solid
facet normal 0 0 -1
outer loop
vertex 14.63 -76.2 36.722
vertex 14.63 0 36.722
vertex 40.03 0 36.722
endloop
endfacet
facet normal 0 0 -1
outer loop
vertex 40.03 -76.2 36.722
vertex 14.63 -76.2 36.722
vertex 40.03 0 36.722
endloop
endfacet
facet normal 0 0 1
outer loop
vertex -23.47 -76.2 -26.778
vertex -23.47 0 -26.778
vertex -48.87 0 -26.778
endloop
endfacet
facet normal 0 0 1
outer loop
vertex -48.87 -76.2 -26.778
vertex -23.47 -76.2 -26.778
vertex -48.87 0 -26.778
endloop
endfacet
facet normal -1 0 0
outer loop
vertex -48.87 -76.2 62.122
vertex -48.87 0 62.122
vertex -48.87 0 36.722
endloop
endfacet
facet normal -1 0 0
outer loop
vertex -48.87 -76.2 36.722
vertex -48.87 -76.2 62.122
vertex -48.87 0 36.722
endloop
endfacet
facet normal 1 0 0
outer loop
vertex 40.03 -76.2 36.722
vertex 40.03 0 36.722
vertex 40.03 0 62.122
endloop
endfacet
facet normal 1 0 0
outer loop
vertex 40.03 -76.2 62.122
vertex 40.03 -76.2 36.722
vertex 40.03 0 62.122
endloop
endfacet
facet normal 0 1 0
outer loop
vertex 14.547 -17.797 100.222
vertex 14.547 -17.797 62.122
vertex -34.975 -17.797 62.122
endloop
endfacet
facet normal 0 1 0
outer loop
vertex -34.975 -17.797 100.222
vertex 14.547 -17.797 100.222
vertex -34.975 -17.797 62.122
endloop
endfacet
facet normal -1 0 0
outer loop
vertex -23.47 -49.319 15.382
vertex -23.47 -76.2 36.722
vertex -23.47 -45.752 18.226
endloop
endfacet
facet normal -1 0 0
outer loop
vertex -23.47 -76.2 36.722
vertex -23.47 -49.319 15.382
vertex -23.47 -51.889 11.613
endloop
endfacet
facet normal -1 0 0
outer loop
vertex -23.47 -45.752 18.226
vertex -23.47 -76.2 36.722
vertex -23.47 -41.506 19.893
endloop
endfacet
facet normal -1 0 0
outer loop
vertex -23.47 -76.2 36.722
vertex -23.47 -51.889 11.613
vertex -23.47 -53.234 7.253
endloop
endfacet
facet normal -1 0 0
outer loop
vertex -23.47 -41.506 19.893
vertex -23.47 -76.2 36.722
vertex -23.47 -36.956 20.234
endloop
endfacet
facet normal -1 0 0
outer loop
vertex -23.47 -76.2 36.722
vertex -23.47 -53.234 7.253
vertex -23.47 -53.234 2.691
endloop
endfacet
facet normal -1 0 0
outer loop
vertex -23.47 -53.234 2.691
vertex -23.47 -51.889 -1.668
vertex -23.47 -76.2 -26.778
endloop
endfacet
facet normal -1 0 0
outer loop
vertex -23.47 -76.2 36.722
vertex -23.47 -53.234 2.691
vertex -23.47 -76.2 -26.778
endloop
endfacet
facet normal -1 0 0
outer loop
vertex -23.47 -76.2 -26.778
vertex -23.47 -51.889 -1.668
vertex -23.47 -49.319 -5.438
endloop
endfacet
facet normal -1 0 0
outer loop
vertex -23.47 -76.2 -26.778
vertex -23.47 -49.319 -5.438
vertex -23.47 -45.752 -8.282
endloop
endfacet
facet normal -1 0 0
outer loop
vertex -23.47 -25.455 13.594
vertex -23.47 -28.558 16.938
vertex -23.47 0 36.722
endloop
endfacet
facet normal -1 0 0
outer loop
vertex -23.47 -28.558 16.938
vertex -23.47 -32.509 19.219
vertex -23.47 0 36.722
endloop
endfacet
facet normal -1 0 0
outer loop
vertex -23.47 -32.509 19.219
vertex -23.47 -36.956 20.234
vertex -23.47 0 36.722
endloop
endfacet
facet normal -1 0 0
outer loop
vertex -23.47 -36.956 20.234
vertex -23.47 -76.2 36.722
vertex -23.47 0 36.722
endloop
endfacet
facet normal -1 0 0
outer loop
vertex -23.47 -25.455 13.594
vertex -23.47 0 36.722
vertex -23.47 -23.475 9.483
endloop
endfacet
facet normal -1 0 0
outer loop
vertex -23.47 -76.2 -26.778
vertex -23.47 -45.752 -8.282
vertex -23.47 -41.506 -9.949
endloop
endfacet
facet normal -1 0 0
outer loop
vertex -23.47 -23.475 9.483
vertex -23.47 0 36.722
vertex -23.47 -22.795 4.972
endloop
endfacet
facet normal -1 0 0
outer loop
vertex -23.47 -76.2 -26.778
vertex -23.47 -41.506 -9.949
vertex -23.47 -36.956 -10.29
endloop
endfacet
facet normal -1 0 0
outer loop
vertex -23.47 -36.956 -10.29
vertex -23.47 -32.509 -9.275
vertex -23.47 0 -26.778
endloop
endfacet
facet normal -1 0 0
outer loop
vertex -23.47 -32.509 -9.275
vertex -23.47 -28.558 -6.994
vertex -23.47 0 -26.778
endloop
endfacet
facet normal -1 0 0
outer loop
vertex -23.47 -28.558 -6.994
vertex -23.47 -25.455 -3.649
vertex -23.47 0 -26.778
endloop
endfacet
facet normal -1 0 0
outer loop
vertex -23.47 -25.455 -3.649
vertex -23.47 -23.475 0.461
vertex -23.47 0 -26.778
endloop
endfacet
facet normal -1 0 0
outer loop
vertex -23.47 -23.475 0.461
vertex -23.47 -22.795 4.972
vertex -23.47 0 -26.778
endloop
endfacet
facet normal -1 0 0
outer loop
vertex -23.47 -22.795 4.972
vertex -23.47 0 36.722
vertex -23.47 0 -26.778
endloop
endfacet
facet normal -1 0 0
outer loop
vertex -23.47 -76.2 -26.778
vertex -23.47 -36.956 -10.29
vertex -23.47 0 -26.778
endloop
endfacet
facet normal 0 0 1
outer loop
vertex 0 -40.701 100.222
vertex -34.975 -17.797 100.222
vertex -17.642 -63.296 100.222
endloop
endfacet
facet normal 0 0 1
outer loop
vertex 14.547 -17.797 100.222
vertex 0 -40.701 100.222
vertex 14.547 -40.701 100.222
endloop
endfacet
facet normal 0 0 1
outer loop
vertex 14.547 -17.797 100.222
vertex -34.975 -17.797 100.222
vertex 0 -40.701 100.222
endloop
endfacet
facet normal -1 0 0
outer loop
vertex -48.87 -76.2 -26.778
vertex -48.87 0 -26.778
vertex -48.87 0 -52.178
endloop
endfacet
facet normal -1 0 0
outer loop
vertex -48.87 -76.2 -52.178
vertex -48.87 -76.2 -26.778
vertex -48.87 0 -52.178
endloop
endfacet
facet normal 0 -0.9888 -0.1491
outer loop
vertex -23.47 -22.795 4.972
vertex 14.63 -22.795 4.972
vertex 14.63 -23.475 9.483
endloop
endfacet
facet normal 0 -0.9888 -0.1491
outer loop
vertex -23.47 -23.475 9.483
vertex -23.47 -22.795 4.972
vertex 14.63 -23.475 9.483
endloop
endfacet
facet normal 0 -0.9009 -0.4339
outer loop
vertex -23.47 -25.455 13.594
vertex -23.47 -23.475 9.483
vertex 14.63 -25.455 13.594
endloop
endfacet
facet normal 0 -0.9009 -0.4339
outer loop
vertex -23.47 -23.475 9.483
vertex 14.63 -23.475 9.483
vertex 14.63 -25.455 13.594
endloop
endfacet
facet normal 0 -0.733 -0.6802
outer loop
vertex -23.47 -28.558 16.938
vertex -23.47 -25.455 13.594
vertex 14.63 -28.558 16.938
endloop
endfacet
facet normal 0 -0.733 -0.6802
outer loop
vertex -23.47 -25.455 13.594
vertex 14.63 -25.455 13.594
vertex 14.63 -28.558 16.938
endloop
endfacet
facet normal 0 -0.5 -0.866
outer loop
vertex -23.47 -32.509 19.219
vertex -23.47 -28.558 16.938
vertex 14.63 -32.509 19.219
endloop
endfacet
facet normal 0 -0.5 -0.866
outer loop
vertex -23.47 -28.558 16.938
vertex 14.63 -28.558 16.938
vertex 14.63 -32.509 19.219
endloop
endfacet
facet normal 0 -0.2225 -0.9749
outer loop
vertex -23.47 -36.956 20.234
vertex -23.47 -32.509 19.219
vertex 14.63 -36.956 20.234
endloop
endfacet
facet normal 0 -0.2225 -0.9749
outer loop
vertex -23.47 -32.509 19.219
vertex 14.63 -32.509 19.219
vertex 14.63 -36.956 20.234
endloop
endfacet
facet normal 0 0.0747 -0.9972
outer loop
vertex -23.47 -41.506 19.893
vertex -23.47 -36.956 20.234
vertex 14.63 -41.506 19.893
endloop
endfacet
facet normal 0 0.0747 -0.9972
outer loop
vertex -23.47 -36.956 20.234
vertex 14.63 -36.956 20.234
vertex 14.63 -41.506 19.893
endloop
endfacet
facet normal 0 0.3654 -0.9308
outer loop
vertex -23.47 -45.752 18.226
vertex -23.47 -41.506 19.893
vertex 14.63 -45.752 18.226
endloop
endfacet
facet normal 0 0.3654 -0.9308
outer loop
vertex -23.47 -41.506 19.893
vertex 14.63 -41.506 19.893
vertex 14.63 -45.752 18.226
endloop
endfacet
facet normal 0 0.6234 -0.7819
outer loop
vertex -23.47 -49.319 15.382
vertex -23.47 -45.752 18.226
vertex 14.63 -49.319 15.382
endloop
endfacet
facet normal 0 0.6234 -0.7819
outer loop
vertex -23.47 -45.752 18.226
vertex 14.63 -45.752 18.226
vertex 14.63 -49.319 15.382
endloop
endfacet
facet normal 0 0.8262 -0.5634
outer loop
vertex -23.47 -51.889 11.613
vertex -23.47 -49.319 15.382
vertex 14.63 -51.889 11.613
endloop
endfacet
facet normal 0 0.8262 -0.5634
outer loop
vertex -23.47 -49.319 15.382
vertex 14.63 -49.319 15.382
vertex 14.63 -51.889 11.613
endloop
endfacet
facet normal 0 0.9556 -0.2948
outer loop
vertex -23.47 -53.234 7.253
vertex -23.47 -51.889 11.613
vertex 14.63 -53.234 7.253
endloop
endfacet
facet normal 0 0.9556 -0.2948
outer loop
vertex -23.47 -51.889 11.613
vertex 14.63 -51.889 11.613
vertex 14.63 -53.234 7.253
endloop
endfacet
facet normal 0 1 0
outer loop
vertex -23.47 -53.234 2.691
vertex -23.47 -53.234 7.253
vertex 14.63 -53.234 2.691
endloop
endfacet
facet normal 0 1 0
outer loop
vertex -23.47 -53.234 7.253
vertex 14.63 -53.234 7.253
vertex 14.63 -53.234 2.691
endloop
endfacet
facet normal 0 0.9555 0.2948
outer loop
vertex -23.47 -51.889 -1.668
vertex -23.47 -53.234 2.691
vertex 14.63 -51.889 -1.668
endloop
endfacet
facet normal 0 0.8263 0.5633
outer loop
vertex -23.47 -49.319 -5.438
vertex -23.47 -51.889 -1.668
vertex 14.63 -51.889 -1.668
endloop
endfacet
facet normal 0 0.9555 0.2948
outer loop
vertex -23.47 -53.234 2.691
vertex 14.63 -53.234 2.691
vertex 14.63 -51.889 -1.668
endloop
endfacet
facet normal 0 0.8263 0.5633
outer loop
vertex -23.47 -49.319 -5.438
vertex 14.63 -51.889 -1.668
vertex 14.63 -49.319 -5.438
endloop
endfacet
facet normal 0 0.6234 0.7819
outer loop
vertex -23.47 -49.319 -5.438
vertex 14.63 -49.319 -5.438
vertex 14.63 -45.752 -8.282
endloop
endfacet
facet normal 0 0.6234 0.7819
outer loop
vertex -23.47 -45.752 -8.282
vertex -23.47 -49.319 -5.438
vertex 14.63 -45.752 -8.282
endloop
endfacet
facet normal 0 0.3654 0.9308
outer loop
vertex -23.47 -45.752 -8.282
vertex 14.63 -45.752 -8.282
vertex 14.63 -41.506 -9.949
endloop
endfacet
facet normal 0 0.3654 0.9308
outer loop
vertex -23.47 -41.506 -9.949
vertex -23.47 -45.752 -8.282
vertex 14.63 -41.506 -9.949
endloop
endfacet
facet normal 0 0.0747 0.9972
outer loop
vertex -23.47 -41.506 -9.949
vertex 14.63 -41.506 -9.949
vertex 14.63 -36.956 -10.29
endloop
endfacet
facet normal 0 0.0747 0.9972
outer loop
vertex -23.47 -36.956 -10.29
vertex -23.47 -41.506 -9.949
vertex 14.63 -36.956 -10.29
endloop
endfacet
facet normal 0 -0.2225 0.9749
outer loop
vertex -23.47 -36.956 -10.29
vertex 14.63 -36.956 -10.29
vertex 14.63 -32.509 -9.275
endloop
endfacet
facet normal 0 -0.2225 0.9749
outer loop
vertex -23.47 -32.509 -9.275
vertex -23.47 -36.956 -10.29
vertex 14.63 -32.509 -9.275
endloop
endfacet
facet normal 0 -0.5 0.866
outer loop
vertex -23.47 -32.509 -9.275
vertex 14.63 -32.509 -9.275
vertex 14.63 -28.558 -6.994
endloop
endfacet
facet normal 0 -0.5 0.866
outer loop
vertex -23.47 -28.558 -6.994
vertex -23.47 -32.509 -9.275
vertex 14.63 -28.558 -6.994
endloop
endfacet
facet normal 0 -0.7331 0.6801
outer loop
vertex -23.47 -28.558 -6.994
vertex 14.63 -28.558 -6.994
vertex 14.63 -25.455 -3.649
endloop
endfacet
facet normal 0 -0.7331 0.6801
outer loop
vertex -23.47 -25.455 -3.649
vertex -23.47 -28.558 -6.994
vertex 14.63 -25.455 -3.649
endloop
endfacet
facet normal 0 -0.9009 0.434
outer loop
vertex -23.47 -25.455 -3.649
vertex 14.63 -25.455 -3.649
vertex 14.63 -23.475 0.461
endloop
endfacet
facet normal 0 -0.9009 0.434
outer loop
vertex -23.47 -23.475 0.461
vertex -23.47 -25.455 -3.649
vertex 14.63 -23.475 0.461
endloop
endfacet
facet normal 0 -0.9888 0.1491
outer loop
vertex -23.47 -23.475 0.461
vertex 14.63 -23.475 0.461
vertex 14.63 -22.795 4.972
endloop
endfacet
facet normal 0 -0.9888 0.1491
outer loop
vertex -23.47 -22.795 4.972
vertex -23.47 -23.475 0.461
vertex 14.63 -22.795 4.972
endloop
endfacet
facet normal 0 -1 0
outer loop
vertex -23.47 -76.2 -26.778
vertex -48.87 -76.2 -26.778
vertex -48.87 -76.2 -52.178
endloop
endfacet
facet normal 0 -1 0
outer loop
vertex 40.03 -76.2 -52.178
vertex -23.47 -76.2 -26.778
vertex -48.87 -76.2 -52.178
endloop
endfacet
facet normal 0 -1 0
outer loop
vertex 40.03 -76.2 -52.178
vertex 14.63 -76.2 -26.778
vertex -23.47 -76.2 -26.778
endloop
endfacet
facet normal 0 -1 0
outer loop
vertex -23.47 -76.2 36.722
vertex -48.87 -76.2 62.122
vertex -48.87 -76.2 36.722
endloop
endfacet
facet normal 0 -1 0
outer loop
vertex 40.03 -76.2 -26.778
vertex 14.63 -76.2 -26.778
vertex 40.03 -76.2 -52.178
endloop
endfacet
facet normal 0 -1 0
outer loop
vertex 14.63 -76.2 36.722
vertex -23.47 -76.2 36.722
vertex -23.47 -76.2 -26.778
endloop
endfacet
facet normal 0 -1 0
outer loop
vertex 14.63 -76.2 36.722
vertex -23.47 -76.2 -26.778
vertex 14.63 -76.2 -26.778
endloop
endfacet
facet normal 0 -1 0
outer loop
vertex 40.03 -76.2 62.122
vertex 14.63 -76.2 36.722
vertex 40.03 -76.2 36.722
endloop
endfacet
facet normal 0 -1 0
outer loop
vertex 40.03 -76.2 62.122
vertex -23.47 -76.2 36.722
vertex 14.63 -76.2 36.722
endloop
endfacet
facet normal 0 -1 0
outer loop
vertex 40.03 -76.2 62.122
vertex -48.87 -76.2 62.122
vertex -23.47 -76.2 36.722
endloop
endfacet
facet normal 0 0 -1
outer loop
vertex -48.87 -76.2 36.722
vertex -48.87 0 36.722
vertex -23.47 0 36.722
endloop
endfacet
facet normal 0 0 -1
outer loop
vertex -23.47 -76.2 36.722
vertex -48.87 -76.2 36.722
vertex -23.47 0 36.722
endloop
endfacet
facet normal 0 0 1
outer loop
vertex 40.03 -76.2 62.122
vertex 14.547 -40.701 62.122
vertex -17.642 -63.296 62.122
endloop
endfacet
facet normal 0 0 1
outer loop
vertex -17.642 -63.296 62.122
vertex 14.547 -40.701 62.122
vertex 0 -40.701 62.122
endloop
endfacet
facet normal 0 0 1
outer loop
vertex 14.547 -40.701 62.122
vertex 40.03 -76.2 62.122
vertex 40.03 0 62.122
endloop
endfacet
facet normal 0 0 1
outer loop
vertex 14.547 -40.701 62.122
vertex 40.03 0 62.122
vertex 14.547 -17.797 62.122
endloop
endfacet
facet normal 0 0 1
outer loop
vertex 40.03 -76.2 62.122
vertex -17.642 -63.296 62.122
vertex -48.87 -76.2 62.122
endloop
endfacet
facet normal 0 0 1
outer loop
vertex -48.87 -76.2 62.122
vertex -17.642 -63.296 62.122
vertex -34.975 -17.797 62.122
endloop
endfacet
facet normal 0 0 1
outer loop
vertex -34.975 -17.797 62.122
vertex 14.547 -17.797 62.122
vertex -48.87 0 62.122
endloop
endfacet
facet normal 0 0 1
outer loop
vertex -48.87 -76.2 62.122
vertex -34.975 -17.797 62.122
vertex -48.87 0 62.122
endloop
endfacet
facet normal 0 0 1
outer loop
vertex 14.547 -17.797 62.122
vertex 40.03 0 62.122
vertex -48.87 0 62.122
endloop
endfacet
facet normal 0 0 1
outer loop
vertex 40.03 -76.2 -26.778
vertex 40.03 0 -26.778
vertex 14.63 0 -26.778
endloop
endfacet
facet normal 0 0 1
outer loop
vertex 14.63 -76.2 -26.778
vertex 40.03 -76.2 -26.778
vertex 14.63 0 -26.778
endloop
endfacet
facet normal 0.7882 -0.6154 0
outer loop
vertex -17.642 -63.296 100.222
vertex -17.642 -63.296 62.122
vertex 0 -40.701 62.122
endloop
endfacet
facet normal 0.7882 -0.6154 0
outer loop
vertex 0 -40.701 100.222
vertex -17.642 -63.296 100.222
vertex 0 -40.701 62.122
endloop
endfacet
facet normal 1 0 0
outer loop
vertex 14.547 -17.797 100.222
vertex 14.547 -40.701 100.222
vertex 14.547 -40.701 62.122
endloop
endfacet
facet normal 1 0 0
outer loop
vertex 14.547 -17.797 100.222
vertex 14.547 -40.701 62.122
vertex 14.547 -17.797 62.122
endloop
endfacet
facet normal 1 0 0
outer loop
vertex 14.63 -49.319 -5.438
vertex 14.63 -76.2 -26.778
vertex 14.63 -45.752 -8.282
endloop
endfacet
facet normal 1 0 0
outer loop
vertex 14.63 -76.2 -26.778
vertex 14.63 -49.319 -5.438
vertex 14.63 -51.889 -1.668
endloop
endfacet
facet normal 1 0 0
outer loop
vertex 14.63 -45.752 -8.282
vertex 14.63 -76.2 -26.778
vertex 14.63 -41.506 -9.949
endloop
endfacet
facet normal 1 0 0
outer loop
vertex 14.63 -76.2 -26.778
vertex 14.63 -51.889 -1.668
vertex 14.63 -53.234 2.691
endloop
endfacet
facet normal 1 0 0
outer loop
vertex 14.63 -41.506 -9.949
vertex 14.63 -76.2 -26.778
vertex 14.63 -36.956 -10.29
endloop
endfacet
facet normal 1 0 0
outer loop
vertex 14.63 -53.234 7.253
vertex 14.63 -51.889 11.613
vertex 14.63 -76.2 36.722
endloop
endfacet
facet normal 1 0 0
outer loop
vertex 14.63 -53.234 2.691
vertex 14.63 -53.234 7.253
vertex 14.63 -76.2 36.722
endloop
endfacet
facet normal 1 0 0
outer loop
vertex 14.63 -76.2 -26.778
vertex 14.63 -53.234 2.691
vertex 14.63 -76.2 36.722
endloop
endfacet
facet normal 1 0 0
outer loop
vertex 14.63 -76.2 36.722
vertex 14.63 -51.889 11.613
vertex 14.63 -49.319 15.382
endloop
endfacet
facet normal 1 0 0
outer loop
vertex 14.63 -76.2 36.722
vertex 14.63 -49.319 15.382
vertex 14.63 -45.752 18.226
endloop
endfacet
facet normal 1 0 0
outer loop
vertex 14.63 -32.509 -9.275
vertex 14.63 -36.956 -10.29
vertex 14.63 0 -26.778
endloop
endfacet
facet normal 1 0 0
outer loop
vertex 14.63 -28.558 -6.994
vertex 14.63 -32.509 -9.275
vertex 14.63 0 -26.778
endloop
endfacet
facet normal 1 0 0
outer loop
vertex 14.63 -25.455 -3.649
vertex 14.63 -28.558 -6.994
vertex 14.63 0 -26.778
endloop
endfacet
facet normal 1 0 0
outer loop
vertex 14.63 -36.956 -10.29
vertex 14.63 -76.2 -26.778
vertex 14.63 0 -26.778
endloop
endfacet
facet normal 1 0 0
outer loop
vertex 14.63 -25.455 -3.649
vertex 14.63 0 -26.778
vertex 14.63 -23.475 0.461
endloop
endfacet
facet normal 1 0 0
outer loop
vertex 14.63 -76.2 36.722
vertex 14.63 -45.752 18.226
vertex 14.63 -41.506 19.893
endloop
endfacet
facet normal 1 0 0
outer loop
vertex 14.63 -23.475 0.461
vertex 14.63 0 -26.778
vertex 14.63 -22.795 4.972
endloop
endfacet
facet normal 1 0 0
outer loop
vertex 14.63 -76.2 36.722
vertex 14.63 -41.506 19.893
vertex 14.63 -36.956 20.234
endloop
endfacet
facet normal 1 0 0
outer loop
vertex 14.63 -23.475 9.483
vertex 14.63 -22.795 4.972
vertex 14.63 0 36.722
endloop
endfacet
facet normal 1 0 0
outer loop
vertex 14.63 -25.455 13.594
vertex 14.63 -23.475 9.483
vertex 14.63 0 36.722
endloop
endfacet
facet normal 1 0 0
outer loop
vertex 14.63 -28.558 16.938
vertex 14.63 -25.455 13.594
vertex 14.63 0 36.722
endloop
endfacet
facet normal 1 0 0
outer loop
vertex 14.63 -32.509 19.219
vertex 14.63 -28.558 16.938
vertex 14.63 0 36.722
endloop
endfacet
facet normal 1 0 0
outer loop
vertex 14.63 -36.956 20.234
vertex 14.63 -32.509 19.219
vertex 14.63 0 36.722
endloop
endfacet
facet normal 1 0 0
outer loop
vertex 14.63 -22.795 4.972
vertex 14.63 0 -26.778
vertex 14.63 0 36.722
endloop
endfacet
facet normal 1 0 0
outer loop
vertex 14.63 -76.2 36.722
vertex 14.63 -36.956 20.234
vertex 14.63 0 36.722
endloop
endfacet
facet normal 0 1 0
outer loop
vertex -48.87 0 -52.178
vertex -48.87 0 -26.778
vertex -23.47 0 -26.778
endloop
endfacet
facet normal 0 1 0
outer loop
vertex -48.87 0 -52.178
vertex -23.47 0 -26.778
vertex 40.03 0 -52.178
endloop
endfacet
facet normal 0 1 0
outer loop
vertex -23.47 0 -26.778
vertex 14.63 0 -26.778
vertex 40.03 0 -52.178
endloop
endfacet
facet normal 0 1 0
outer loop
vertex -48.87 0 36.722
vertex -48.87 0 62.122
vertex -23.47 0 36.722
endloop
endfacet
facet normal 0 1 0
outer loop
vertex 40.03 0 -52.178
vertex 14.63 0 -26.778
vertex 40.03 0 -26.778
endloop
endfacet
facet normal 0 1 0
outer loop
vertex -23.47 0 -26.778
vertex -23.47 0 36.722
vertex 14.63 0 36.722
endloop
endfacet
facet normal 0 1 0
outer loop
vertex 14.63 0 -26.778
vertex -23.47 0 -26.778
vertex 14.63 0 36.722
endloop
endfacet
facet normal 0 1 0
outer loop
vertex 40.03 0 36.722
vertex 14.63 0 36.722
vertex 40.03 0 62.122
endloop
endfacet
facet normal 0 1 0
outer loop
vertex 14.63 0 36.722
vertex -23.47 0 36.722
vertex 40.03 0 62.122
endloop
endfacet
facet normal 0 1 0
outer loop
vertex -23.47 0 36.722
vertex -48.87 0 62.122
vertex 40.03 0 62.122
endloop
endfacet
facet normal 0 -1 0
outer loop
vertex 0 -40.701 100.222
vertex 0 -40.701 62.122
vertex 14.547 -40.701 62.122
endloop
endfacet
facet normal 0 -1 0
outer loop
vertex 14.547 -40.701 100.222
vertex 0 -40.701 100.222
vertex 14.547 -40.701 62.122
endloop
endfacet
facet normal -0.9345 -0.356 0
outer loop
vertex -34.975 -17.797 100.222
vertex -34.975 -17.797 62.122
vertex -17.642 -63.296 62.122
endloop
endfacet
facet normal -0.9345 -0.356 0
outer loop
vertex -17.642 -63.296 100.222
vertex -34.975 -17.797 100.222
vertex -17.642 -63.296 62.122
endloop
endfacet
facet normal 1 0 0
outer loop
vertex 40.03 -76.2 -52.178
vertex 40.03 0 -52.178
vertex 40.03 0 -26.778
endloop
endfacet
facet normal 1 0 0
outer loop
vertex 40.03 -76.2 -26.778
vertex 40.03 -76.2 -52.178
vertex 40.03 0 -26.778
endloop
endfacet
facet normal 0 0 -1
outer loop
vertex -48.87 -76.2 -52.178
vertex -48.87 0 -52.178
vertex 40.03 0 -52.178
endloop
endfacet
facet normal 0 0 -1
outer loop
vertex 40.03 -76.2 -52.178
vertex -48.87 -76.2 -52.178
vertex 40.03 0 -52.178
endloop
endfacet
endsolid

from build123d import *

# Parameters (mm, degrees)
F1_DEPTH = 76.2
F2_R     = 15.3048554067
F3_DEPTH = 63.501
F5_DEPTH = 38.1


# Not quite as in the source:
# - a feature names something its author has since deleted; it is built from what else it names


with BuildPart() as f1:
    # F0 (on Front) → F1 (new body)
    with BuildSketch(Plane.XZ):
        Polygon((-48.8696609855, -52.1779545115), (40.0303390145, -52.1779545115), (40.0303390145, -26.7779545115), (14.6303390145, -26.7779545115), (14.6303390145, 36.7220454885), (40.0303390145, 36.7220454885), (40.0303390145, 62.1220454885), (-48.8696609855, 62.1220454885), (-48.8696609855, 36.7220454885), (-23.4696609855, 36.7220454885), (-23.4696609855, -26.7779545115), (-48.8696609855, -26.7779545115), align=None)
    extrude(amount=F1_DEPTH)

    # F2 (on face) → F3 (cut, through all)
    with BuildSketch(Plane.YZ.offset(14.6303390145)):
        with Locations((-38.1, 4.9720454885)):
            Circle(F2_R)
    extrude(amount=-F3_DEPTH, mode=Mode.SUBTRACT)

    # F4 (on face) → F5 (join)
    with BuildSketch(Plane.XY.offset(62.1220454885)):
        Polygon((-17.6424384117, -63.2961168885), (0, -40.7014116645), (14.5472735167, -40.7014116645), (14.5472735167, -17.7971962839), (-34.9753573537, -17.7971962839), align=None)
    extrude(amount=F5_DEPTH)


solid = f1.part
